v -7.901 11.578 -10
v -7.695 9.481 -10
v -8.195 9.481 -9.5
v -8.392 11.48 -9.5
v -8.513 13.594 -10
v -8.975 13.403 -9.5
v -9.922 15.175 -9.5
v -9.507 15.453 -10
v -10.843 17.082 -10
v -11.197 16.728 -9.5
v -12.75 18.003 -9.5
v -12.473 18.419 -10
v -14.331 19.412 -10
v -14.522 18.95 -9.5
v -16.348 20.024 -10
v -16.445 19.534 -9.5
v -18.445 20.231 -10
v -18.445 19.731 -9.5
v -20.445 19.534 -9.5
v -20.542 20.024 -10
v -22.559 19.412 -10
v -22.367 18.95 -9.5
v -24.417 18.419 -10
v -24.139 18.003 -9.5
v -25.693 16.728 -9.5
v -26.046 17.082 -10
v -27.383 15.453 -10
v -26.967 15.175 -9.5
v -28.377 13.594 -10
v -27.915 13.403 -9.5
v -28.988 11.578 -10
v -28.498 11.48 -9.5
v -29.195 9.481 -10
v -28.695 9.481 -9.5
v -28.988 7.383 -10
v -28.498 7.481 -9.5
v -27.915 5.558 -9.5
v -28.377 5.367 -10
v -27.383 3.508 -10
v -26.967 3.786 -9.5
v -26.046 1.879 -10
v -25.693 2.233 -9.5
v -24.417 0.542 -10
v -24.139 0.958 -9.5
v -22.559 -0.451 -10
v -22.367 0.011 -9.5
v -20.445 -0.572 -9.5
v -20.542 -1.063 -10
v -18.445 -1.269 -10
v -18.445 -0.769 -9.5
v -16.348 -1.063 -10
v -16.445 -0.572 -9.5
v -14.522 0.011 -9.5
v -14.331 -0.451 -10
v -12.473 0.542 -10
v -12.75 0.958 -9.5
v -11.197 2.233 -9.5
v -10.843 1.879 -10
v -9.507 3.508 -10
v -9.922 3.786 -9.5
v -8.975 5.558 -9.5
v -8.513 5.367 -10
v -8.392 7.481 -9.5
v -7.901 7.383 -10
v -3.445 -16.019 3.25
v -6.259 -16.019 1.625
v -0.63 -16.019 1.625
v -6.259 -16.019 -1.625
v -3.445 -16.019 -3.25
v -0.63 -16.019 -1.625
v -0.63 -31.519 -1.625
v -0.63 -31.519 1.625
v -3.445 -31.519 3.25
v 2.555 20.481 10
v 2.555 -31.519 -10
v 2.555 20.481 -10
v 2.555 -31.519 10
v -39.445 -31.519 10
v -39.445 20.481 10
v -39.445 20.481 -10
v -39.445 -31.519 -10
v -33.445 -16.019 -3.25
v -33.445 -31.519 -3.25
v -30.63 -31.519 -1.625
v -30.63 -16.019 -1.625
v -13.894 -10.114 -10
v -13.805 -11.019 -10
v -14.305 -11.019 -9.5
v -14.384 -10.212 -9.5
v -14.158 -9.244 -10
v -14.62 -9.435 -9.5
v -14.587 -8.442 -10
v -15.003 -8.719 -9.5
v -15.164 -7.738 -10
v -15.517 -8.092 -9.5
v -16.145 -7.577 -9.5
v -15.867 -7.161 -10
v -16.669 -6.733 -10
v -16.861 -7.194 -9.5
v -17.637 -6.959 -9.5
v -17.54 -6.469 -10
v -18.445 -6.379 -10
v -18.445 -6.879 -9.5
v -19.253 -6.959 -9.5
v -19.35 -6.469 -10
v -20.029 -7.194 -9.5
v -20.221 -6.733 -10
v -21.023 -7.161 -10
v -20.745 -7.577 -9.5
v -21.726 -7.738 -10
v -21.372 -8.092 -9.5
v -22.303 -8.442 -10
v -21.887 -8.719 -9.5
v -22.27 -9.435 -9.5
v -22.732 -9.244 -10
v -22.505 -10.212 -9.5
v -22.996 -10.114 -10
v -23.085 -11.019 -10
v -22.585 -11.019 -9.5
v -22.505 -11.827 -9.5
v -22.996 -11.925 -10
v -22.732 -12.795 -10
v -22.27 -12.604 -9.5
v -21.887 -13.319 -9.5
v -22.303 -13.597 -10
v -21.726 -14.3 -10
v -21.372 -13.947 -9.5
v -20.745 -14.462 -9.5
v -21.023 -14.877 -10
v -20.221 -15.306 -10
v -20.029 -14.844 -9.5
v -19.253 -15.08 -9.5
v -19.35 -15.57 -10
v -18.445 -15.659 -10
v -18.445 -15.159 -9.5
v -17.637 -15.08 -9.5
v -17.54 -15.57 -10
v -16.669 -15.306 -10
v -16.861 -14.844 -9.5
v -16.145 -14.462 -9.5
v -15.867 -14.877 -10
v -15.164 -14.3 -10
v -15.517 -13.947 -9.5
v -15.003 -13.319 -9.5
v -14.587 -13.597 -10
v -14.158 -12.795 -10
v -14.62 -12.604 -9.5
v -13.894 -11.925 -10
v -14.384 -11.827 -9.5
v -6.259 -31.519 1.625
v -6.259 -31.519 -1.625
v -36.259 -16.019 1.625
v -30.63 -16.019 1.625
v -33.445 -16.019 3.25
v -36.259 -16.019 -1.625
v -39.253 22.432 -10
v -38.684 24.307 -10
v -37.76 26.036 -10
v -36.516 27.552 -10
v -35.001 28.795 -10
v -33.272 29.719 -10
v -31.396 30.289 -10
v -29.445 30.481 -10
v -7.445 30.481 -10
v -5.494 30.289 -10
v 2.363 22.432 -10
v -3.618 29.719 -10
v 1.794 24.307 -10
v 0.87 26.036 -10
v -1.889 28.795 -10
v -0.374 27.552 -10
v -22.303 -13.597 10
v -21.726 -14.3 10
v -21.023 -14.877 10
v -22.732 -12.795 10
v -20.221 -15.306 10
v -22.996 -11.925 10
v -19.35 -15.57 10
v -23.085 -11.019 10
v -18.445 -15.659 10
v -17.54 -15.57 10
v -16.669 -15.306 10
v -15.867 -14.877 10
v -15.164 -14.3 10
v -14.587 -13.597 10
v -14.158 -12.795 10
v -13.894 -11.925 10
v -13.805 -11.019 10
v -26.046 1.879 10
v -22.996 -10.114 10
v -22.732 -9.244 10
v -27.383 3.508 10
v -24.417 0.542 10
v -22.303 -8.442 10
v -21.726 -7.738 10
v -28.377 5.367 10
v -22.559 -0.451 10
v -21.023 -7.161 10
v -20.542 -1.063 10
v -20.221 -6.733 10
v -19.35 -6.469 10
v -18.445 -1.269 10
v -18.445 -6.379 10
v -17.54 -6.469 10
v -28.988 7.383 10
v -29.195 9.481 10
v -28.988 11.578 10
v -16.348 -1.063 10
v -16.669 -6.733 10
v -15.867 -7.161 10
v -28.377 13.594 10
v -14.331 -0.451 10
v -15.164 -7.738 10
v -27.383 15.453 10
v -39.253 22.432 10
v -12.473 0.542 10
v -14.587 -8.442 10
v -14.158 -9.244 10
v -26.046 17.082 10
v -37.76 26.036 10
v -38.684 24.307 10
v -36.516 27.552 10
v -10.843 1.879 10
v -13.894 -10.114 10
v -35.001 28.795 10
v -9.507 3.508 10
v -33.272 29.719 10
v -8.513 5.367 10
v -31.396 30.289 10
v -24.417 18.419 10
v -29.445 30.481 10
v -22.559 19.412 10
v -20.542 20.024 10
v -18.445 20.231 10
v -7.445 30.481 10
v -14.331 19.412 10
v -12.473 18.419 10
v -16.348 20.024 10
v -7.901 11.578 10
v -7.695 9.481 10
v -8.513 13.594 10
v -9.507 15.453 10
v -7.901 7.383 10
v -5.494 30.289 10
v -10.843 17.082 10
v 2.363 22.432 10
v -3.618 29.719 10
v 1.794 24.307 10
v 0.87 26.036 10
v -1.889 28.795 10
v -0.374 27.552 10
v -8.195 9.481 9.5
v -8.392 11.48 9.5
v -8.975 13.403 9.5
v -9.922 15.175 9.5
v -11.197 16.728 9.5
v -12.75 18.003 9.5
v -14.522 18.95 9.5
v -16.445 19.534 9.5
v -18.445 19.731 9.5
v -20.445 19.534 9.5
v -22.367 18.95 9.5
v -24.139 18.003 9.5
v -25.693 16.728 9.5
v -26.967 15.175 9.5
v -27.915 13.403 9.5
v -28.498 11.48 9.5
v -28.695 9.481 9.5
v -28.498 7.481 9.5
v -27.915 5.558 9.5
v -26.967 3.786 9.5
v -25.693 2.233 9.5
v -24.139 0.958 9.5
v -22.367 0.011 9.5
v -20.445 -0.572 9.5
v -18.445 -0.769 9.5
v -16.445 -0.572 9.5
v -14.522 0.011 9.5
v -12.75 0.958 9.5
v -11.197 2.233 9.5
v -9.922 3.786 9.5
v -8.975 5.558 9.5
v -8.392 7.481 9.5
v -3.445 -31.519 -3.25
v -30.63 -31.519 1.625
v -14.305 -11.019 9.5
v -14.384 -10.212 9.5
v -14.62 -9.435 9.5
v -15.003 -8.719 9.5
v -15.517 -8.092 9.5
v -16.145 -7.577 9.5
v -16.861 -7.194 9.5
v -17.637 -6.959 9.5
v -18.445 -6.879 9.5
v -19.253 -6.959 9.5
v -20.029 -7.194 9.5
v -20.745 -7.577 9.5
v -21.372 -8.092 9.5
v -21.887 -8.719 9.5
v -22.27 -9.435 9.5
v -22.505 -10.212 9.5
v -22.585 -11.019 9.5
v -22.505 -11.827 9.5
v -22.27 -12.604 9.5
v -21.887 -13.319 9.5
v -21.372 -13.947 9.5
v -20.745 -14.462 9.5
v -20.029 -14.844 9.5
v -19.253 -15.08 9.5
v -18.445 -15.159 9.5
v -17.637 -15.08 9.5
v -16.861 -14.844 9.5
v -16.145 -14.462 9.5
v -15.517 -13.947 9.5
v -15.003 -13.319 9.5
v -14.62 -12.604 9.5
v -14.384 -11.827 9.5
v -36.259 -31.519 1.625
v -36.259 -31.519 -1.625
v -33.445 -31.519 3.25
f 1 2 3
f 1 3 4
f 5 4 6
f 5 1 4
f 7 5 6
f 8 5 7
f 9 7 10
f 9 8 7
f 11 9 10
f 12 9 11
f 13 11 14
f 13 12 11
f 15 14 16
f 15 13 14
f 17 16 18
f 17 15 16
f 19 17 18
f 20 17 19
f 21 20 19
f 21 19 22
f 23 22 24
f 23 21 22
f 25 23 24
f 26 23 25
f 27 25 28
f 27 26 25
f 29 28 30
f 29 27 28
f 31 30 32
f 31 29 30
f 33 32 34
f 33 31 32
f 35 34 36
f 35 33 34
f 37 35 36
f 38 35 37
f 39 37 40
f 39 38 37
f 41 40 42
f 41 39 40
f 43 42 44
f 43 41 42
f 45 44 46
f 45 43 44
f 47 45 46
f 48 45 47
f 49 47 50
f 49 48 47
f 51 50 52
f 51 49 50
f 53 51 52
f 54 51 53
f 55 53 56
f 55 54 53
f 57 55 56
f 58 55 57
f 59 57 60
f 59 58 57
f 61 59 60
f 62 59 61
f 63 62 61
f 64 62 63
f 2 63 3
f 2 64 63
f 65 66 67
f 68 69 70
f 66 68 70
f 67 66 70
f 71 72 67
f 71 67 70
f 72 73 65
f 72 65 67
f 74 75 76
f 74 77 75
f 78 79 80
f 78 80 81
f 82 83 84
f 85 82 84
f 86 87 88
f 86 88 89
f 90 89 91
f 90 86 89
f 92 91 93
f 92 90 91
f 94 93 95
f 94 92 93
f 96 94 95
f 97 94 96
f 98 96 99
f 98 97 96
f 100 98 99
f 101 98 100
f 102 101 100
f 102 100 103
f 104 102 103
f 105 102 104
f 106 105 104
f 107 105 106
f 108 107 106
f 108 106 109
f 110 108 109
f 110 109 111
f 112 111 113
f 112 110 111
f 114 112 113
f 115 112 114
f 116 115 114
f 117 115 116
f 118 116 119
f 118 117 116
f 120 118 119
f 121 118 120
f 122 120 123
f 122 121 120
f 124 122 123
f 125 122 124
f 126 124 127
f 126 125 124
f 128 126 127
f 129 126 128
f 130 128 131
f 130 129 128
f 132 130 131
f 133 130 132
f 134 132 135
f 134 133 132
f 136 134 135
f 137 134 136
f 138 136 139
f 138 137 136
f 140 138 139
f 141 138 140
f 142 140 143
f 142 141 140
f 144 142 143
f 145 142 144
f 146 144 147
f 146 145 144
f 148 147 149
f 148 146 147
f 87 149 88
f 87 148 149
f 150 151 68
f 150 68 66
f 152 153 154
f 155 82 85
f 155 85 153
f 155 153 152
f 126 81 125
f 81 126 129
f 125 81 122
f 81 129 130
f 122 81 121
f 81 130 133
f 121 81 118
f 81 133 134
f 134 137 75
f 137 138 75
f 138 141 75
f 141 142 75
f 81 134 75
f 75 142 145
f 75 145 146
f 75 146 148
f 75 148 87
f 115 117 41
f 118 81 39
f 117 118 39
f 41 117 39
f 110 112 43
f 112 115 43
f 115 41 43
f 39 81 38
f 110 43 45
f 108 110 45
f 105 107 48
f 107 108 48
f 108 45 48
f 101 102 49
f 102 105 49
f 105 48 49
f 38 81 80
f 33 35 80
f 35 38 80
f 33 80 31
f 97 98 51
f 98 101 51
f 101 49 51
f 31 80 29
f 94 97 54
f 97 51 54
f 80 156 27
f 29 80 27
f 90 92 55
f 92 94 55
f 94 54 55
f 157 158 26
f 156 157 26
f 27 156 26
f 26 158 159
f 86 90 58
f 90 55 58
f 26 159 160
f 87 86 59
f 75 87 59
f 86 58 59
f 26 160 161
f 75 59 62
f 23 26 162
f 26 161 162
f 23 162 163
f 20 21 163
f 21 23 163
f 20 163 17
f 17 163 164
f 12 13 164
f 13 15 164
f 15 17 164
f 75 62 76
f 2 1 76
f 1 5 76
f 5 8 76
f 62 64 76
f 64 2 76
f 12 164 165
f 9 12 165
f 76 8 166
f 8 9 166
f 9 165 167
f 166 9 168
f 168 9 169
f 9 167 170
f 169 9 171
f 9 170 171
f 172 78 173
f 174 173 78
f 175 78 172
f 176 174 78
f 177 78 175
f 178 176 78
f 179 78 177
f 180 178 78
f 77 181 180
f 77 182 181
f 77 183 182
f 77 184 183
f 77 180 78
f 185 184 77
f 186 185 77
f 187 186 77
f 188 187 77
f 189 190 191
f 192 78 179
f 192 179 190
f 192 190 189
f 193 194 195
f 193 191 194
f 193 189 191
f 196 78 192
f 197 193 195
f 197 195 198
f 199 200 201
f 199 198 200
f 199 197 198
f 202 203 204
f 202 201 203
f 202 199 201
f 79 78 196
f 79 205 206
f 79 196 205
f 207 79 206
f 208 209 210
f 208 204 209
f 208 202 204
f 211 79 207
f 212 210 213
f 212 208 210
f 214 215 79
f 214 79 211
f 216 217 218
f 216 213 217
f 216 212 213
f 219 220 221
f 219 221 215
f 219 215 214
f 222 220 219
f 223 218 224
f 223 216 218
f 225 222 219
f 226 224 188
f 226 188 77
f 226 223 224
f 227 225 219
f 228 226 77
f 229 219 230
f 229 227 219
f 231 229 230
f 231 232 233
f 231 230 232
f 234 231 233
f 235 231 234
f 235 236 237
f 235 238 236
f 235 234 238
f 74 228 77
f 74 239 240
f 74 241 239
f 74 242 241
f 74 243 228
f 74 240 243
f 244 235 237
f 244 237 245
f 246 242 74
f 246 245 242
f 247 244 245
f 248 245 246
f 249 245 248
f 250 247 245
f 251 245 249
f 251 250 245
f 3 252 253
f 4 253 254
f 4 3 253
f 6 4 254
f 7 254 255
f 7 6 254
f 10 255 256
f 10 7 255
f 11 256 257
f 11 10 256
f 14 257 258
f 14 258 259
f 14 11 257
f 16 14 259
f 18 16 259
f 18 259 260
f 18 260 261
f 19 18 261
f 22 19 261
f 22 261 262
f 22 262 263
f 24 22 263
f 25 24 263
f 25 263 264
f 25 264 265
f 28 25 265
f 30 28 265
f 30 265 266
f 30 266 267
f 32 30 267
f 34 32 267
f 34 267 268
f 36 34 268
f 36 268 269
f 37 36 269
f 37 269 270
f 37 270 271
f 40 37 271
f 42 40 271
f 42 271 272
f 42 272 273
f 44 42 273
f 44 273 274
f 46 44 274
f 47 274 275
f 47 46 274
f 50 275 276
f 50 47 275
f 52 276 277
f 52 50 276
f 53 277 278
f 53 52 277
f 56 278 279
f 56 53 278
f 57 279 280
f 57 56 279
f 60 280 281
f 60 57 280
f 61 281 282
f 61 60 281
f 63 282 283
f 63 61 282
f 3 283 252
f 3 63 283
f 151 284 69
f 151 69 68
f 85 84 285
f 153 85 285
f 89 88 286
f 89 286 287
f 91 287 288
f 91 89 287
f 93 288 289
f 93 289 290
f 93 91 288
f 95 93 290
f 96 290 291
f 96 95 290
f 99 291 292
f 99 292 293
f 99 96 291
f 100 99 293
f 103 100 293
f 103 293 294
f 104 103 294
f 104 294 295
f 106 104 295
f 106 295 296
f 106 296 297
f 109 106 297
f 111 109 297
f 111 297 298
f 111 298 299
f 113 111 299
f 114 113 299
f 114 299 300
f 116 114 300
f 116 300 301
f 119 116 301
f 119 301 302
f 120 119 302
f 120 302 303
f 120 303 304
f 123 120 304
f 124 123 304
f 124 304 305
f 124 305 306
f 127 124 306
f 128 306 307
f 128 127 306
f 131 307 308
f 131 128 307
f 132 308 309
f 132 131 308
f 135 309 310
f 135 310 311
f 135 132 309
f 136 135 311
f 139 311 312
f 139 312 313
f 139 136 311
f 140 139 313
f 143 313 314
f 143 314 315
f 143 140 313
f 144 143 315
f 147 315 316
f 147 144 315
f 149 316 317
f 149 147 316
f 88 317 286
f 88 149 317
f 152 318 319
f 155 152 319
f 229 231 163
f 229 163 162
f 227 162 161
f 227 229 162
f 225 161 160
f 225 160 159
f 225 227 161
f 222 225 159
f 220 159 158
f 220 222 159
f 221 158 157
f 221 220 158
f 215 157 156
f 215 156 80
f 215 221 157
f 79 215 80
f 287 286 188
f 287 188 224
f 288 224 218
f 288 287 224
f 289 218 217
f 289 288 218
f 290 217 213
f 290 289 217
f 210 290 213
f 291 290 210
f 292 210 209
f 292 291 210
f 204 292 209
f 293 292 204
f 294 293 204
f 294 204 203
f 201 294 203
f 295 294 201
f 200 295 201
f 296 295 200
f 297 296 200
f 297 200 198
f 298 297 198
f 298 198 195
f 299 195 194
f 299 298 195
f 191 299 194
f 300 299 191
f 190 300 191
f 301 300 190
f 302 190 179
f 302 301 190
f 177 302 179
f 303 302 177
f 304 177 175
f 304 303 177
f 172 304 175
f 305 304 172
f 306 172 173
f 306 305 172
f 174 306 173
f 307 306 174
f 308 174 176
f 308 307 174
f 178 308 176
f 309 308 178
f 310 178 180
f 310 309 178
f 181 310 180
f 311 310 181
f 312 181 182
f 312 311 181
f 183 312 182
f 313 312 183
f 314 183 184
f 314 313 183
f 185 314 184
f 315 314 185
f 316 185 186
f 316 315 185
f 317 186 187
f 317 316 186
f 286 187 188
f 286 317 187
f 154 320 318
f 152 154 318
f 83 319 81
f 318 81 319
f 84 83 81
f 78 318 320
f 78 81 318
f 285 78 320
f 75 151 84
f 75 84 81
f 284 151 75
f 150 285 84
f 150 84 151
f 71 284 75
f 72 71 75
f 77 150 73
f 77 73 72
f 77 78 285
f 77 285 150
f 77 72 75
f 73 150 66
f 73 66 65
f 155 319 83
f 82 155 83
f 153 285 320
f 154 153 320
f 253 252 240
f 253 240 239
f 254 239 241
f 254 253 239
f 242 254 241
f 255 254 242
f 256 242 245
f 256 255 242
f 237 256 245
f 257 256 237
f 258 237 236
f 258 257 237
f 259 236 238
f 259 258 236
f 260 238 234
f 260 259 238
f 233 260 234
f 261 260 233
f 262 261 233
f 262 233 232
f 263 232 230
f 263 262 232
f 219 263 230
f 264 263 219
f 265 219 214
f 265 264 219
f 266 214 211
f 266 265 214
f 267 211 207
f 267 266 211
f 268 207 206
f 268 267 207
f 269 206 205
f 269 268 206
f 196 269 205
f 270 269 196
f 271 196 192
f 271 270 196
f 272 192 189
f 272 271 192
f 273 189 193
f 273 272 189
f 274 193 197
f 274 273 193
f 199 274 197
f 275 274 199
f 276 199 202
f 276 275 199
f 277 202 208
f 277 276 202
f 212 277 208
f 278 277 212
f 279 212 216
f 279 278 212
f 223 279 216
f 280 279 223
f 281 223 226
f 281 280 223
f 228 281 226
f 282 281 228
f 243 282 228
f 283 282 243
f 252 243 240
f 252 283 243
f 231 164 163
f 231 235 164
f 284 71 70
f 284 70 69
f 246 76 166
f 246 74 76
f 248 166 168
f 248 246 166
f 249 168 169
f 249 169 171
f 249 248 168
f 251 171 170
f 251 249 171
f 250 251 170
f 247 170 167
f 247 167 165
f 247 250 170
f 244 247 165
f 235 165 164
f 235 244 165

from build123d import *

# Parameters (mm, degrees)
SKETCH1_R           = 10.25
SKETCH1_R_2         = 4.14
BOSS_EXTRUDE1_DEPTH = 10
CHAMFER1_SIZE       = 0.5
CUT_EXTRUDE1_DEPTH  = 15.5


with BuildPart() as part:
    # Sketch1 → Boss-Extrude1 (new, symmetric)
    with BuildSketch(Plane.XY):
        with BuildLine():
            Line((-7.444896481, 30.480652594), (-29.444896481, 30.480652594))
            ThreePointArc((-29.444896481, 30.480652594), (-36.515964293, 27.551720406), (-39.444896481, 20.480652594))
            Line((-39.444896481, 20.480652594), (-39.444896481, -31.519347406))
            Line((-39.444896481, -31.519347406), (2.555103519, -31.519347406))
            Line((2.555103519, -31.519347406), (2.555103519, 20.480652594))
            ThreePointArc((2.555103519, 20.480652594), (-0.373828669, 27.551720406), (-7.444896481, 30.480652594))
        make_face()
        with Locations((-18.444896481, 9.480652594)):
            Circle(SKETCH1_R, mode=Mode.SUBTRACT)
        with Locations((-18.444896481, -11.019347406)):
            Circle(SKETCH1_R_2, mode=Mode.SUBTRACT)
    extrude(amount=BOSS_EXTRUDE1_DEPTH, both=True)

    # Chamfer1
    chamfer1_edges = [part.edges().sort_by_distance(p)[0] for p in [
        (-22.584896481, -11.019347406, -10),
        (-22.584896481, -11.019347406, 10),
        (-28.694896481, 9.480652594, -10),
        (-28.694896481, 9.480652594, 10),
    ]]
    chamfer(chamfer1_edges, length=CHAMFER1_SIZE)

    # Sketch3 → Cut-Extrude1 (cut)
    with BuildSketch(Plane(origin=(0, -31.519347406, 0), x_dir=(-1, 0, 0), z_dir=(0, -1, 0))):
        Polygon((33.444896481, -3.25), (36.259479043, -1.625), (36.259479043, 1.625), (33.444896481, 3.25), (30.630313919, 1.625), (30.630313919, -1.625), align=None)
    cut_extrude1 = extrude(amount=-CUT_EXTRUDE1_DEPTH, mode=Mode.SUBTRACT)

    # Mirror1: Cut-Extrude1 across plane
    add(cut_extrude1.mirror(Plane(origin=(-18.444896481, 0, 0), x_dir=(0, 0, 1), z_dir=(1, 0, 0))), mode=Mode.SUBTRACT)


solid = part.part
